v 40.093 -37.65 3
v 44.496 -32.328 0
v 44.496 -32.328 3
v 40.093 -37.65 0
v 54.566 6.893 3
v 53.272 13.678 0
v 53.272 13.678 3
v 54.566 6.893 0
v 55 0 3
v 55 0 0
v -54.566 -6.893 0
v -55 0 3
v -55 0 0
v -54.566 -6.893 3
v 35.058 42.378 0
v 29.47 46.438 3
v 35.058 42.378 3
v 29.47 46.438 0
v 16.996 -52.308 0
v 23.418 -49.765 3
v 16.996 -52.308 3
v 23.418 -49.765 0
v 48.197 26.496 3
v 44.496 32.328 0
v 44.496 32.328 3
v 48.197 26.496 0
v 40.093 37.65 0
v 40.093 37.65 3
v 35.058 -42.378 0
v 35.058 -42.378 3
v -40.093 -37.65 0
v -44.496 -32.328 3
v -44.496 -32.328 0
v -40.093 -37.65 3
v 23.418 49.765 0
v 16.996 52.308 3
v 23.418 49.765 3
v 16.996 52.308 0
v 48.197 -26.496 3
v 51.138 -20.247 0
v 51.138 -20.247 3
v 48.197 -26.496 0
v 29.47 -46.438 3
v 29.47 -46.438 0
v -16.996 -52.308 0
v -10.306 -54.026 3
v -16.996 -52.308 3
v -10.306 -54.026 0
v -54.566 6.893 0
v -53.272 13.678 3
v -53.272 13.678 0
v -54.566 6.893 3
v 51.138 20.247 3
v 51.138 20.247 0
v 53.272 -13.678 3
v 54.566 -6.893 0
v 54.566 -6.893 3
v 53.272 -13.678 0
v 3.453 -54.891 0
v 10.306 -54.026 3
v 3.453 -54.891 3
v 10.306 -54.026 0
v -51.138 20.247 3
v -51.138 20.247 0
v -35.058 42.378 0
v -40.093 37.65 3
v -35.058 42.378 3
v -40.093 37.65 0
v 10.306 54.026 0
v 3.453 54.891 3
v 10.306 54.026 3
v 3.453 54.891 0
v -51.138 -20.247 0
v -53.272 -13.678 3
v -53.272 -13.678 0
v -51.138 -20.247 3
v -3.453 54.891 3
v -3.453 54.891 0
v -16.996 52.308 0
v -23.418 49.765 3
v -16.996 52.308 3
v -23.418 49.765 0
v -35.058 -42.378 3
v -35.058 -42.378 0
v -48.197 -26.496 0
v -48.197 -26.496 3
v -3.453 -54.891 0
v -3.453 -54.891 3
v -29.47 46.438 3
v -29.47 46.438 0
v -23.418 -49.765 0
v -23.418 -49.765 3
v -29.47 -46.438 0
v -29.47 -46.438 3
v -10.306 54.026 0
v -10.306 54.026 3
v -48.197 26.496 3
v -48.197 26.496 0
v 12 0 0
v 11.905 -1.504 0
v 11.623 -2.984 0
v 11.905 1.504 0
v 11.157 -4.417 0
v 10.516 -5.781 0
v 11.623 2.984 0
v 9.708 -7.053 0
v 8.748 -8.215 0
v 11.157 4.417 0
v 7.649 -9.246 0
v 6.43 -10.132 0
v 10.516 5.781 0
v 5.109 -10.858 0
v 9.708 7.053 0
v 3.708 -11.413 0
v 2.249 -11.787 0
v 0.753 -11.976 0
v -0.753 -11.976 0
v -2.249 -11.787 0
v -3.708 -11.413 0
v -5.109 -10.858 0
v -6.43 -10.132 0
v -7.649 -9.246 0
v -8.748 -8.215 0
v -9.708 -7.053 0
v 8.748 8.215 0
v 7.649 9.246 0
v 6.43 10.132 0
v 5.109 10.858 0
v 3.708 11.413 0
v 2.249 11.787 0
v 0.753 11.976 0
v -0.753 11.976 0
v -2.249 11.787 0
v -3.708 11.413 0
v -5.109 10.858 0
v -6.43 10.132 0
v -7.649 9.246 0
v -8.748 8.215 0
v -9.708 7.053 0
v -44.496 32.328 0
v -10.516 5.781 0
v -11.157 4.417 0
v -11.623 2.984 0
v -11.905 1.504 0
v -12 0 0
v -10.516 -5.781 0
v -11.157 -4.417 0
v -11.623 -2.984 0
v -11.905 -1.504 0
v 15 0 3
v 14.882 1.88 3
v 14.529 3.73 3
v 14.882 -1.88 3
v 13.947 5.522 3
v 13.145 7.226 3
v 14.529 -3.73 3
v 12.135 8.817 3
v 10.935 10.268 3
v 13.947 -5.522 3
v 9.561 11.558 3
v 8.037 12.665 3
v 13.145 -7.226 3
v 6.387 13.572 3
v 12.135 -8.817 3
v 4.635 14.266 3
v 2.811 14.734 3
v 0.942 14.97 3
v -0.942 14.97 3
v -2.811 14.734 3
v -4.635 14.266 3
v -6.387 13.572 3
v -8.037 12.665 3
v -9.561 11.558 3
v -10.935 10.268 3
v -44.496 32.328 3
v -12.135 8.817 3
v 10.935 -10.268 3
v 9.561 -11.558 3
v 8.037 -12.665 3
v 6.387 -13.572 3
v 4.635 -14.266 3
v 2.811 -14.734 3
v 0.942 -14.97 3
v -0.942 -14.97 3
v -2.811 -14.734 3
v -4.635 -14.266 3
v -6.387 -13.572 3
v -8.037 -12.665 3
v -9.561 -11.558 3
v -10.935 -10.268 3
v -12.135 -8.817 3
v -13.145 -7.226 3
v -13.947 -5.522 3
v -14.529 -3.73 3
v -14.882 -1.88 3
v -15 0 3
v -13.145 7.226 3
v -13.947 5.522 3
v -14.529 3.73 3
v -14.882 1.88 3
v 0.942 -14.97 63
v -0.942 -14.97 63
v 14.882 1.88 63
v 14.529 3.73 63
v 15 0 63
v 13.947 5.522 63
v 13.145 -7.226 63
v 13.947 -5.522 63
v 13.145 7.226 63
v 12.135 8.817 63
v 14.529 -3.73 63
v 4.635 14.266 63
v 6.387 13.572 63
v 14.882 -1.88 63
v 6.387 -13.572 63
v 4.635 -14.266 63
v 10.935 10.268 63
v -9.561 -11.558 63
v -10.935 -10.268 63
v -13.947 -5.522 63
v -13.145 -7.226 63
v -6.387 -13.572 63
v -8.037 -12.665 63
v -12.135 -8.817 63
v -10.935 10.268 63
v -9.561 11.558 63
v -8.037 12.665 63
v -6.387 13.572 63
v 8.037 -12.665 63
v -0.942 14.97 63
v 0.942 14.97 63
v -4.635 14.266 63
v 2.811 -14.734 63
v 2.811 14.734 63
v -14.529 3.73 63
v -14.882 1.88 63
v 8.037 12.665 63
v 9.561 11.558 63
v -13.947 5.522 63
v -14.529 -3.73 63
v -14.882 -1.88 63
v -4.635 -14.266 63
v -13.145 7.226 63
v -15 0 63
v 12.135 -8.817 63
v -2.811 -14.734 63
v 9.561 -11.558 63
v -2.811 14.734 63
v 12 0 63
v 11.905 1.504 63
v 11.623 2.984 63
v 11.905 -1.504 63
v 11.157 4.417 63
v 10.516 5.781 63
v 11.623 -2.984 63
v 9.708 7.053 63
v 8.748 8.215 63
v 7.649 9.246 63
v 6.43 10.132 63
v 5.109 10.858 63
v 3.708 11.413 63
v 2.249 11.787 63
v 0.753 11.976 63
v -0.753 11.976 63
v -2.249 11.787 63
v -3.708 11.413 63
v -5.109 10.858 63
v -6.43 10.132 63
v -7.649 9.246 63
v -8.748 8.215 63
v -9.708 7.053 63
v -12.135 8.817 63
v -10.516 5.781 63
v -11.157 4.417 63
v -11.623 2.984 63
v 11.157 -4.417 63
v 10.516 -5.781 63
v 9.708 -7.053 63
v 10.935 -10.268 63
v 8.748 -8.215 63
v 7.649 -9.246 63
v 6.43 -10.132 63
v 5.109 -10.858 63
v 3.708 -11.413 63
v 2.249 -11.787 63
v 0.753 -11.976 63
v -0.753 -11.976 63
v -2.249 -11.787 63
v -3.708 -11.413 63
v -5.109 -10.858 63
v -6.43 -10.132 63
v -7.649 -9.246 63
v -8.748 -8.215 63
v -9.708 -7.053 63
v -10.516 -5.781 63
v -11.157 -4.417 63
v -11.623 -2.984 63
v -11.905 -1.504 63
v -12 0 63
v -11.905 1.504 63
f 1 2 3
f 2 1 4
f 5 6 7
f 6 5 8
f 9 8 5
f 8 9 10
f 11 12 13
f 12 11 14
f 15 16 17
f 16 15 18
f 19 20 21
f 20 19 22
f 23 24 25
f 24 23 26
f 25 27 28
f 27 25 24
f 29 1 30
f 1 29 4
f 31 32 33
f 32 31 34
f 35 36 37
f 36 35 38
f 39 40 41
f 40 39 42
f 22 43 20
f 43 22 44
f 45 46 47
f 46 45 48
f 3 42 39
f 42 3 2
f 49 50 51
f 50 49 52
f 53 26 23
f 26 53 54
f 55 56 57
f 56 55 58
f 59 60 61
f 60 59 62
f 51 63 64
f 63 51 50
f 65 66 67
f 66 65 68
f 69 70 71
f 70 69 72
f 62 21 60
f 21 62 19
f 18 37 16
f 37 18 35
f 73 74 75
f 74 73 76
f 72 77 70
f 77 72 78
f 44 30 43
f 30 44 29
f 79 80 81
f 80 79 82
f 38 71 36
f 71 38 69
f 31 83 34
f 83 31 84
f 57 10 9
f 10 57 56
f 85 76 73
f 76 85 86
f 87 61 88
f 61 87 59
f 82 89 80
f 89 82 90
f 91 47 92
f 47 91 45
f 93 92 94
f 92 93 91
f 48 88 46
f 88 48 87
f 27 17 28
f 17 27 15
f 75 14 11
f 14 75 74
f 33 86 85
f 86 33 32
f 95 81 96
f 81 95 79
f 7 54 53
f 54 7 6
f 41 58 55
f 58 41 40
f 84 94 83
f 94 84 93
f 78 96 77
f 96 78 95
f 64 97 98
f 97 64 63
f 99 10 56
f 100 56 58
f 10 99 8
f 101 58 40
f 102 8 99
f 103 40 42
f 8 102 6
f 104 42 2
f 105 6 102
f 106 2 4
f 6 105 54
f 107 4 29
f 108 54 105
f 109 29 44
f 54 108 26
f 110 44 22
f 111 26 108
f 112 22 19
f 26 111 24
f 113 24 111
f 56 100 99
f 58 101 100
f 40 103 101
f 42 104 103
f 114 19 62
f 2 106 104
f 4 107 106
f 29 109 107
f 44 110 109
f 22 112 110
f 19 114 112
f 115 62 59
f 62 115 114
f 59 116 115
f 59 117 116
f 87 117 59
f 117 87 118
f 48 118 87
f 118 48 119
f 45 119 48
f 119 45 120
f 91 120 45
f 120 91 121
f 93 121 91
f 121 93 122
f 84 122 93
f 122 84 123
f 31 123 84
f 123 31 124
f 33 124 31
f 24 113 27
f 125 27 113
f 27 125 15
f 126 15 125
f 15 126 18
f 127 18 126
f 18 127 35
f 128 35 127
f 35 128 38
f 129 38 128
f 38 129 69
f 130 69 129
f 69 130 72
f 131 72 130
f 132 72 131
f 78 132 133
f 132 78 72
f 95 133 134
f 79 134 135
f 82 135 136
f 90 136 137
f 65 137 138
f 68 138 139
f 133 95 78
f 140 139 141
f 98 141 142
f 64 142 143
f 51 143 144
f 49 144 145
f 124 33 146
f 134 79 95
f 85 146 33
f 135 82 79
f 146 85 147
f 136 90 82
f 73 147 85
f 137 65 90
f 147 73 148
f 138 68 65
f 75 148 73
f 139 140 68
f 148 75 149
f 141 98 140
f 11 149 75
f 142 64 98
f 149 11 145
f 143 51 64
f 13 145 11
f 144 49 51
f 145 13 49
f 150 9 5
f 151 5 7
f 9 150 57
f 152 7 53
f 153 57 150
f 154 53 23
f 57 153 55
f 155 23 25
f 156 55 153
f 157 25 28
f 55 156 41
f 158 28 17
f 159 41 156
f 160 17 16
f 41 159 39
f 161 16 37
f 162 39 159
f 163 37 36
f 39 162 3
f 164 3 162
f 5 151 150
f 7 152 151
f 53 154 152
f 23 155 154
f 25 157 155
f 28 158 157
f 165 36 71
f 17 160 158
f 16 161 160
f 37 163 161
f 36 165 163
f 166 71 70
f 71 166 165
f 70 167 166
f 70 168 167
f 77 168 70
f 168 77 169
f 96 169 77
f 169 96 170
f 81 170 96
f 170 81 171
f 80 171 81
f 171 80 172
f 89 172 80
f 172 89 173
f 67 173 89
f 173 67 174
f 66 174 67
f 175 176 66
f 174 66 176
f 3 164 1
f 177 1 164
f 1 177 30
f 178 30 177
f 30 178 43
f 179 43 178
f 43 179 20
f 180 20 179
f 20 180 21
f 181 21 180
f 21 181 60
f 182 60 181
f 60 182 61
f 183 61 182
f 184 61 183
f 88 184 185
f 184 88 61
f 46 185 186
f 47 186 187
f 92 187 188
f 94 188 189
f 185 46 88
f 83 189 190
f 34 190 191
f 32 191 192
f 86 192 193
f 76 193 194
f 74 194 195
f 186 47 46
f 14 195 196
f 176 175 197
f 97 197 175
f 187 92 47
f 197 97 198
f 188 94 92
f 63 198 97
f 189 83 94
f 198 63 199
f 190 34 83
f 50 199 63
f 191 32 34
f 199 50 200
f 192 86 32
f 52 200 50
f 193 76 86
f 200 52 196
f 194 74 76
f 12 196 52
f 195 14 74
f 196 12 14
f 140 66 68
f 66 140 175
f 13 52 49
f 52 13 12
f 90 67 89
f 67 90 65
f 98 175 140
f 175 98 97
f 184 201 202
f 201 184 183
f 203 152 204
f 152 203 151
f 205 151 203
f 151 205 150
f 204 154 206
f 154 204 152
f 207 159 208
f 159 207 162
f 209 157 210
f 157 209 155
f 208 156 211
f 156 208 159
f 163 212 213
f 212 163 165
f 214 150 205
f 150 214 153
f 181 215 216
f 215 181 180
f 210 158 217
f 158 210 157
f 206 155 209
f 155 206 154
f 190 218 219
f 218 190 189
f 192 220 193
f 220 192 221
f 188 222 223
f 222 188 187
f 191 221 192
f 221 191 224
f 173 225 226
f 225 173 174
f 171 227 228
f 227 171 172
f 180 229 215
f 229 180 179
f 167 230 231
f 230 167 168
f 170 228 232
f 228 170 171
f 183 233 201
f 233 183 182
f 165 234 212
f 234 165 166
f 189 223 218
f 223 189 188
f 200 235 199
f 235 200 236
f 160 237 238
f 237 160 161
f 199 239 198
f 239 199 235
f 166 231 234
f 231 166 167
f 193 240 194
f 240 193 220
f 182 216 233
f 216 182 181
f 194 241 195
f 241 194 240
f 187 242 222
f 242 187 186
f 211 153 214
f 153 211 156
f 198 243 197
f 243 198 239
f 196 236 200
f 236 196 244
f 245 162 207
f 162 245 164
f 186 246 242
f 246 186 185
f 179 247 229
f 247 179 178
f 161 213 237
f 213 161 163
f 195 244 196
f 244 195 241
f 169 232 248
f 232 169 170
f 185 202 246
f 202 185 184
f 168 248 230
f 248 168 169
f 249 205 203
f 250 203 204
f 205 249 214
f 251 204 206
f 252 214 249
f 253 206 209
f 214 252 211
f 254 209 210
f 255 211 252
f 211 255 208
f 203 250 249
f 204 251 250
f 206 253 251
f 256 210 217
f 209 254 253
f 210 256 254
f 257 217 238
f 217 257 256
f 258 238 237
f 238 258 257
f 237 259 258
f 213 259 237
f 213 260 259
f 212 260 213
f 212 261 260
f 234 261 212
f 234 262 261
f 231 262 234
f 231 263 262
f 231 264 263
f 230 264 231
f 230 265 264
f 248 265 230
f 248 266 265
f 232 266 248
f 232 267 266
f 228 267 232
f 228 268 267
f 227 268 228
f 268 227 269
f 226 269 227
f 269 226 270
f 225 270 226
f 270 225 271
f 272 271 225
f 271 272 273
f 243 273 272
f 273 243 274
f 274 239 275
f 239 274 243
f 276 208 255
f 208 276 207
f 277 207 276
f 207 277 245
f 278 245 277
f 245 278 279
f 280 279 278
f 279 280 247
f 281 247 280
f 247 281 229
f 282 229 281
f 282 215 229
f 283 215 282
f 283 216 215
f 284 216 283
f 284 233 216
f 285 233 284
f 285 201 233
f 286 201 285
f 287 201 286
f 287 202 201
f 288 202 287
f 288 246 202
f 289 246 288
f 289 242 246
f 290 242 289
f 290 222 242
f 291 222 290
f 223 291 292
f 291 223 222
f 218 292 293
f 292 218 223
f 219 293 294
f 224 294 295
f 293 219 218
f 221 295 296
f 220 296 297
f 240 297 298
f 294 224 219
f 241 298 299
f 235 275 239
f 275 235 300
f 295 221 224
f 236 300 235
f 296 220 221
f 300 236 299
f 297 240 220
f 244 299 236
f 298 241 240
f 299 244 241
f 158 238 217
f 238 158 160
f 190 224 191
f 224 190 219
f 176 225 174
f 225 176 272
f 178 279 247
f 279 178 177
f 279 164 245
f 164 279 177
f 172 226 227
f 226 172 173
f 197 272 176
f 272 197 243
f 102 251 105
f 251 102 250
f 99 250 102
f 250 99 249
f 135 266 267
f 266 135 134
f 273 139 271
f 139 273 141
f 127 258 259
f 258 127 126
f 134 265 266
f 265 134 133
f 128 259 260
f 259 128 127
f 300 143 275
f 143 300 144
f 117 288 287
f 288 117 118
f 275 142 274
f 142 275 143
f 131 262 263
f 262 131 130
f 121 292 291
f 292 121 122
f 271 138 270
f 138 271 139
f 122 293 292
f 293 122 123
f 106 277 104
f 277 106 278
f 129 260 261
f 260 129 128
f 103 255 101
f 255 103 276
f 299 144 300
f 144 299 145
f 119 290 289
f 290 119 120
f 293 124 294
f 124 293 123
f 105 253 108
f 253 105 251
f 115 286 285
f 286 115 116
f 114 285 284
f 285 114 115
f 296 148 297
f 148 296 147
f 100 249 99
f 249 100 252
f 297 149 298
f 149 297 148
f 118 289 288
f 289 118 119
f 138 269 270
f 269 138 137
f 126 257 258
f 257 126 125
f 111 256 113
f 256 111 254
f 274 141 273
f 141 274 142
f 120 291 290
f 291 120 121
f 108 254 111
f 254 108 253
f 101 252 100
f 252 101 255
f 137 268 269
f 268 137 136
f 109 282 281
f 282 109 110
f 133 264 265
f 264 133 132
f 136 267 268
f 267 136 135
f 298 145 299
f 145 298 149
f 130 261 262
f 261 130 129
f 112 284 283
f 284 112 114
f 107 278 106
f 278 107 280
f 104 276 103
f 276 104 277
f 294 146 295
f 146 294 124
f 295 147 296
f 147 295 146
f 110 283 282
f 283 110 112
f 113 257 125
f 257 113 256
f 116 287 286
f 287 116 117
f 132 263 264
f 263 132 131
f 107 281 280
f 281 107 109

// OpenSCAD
// Enter the spool hole diameter in mm
spoolHoleD = 32;

// Enter the thickness of the spool in mm
spoolHeight = 60;


difference()
{
    union()
    {
        cylinder(r = 55, h = 3);
        cylinder(r = (spoolHoleD-2)/2, h = spoolHeight+3);
    }
    cylinder(r = ((spoolHoleD-2)/2)-3, h = spoolHeight+3);
}
$fn = 50;
